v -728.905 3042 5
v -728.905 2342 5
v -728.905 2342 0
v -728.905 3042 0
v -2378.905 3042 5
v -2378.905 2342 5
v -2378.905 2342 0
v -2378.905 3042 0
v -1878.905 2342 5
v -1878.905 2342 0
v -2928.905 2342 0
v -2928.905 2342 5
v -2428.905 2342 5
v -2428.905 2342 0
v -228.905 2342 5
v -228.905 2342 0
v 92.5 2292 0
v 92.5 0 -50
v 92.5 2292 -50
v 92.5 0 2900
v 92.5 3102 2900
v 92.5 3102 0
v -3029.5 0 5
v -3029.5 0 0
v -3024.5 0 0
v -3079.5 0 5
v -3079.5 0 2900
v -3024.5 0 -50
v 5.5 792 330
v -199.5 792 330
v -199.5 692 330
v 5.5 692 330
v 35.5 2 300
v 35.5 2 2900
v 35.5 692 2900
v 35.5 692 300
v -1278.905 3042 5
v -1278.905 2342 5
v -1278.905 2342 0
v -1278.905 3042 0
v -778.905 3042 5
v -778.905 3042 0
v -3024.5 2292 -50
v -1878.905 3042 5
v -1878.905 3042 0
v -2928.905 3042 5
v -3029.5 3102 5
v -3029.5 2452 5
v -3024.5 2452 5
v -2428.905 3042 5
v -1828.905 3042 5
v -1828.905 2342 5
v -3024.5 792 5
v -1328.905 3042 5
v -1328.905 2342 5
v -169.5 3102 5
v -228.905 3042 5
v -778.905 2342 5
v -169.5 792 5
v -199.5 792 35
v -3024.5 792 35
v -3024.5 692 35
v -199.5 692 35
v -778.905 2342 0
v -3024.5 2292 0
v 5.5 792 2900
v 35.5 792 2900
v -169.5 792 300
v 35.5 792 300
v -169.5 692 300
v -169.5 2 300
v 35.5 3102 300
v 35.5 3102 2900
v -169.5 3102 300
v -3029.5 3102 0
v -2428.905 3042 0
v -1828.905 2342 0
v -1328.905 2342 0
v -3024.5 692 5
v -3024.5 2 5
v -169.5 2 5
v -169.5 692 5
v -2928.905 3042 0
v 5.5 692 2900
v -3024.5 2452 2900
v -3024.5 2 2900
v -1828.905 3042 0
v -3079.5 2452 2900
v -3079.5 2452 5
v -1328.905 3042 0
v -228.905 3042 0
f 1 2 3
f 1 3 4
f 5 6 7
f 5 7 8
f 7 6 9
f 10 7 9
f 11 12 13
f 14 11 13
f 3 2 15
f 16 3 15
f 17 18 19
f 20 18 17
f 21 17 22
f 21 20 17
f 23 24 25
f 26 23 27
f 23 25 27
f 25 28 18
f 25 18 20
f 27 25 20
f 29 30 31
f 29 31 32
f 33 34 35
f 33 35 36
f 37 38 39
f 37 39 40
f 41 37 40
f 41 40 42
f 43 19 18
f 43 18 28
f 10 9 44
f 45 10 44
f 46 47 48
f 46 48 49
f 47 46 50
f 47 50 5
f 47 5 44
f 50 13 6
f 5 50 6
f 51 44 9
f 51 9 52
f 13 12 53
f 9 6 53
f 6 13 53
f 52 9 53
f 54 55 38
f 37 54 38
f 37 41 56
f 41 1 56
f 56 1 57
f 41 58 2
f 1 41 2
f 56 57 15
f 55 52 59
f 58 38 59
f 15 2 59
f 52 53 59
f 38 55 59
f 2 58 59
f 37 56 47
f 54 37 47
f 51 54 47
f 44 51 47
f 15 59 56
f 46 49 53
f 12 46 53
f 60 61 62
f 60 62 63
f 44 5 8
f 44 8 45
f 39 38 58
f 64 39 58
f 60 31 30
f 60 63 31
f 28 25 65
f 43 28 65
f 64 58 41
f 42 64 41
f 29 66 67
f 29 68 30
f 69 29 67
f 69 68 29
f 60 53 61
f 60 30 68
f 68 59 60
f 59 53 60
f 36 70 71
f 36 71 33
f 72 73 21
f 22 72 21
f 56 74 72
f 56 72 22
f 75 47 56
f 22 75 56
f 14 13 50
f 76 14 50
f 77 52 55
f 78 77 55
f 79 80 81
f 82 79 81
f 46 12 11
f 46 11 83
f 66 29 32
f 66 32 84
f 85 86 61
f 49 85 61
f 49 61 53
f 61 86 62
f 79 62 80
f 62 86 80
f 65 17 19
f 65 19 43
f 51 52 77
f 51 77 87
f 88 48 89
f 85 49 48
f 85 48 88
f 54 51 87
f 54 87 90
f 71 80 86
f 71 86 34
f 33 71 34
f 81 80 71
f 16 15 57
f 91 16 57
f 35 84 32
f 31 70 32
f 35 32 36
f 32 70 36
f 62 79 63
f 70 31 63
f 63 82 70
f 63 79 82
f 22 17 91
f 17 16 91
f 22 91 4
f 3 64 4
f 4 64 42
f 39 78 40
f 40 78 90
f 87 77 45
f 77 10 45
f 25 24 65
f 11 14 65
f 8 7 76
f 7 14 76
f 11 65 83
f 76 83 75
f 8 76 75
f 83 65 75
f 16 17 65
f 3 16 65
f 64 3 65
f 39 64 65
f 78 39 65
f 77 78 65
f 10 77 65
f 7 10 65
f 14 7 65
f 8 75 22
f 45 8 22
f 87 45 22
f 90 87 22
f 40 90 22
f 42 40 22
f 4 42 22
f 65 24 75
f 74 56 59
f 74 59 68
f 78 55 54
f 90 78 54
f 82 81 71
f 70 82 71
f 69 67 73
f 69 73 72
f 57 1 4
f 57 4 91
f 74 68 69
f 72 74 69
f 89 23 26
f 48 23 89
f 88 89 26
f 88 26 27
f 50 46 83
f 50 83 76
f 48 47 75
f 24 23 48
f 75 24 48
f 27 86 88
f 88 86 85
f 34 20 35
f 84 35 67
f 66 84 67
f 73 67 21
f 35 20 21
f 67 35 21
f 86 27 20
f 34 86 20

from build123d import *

# Parameters (mm, degrees)
CROQUIS1_W               = 3070
CROQUIS1_H               = 2900
SALIENTE_EXTRUIR1_DEPTH  = 2
CROQUIS4_W               = 5
CROQUIS4_H               = 2600
CROQUIS4_W_2             = 2860
CROQUIS4_H_2             = 5
SALIENTE_EXTRUIR3_DEPTH  = 3100
CROQUIS5_W               = 5
CROQUIS5_H               = 2895
SALIENTE_EXTRUIR4_DEPTH  = 2450
CROQUIS6_W               = 2855
CROQUIS6_H               = 100
SALIENTE_EXTRUIR5_DEPTH  = 30
CROQUIS7_W               = 300
CROQUIS7_H               = 100
SALIENTE_EXTRUIR6_DEPTH  = 30
CROQUIS8_W               = 235
CROQUIS8_H               = 100
SALIENTE_EXTRUIR7_DEPTH  = 30
CROQUIS9_W               = 2600
CROQUIS9_H               = 100
SALIENTE_EXTRUIR8_DEPTH  = 30
CROQUIS11_W              = 500
CROQUIS11_H              = 700
CORTAR_EXTRUIR1_DEPTH    = 30
CROQUIS18_W              = 2900
CROQUIS18_H              = 3102
SALIENTE_EXTRUIR9_DEPTH  = 2
CROQUIS23_W              = 2900
CROQUIS23_H              = 3102
SALIENTE_EXTRUIR10_DEPTH = 50
CROQUIS24_W              = 3117
CROQUIS24_H              = 2292
SALIENTE_EXTRUIR11_DEPTH = 50
CROQUIS25_W              = 2895
CROQUIS25_H              = 2452
SALIENTE_EXTRUIR12_DEPTH = 50


with BuildPart() as part:
    # Croquis1 → Saliente-Extruir1 (new body)
    with BuildSketch(Plane(origin=(0, 0, 0), x_dir=(1, 0, 0), z_dir=(0, 1, 0))):
        with Locations((-1494.5, -1450)):
            Rectangle(CROQUIS1_W, CROQUIS1_H)
    extrude(amount=SALIENTE_EXTRUIR1_DEPTH)

    # Croquis4 → Saliente-Extruir3 (add)
    with BuildSketch(Plane(origin=(0, 2, 0), x_dir=(1, 0, 0), z_dir=(0, 1, 0))):
        with Locations((38, -1600)):
            Rectangle(CROQUIS4_W, CROQUIS4_H)
        Polygon((40.5, -300), (40.5, 0), (-169.5, 0), (-169.5, -5), (-169.5, -300), (35.5, -300), align=None)
        with Locations((-1599.5, -2.5)):
            Rectangle(CROQUIS4_W_2, CROQUIS4_H_2)
    extrude(amount=SALIENTE_EXTRUIR3_DEPTH)

    # Croquis5 → Saliente-Extruir4 (add)
    with BuildSketch(Plane(origin=(0, 2, 0), x_dir=(1, 0, 0), z_dir=(0, 1, 0))):
        with Locations((-3027, -1452.5)):
            Rectangle(CROQUIS5_W, CROQUIS5_H)
    extrude(amount=SALIENTE_EXTRUIR4_DEPTH)

    # Croquis6 → Saliente-Extruir5 (add)
    with BuildSketch(Plane.XY.offset(5)):
        with Locations((-1597, 742)):
            Rectangle(CROQUIS6_W, CROQUIS6_H)
    extrude(amount=SALIENTE_EXTRUIR5_DEPTH)

    # Croquis7 → Saliente-Extruir6 (add)
    with BuildSketch(Plane.ZY.offset(169.5)):
        with Locations((150, 742)):
            Rectangle(CROQUIS7_W, CROQUIS7_H)
    extrude(amount=SALIENTE_EXTRUIR6_DEPTH)

    # Croquis8 → Saliente-Extruir7 (add)
    with BuildSketch(Plane.XY.offset(300)):
        with Locations((-82, 742)):
            Rectangle(CROQUIS8_W, CROQUIS8_H)
    extrude(amount=SALIENTE_EXTRUIR7_DEPTH)

    # Croquis9 → Saliente-Extruir8 (add)
    with BuildSketch(Plane.ZY.offset(-35.5)):
        with Locations((1600, 742)):
            Rectangle(CROQUIS9_W, CROQUIS9_H)
    extrude(amount=SALIENTE_EXTRUIR8_DEPTH)

    # Croquis11 → Cortar-Extruir1 (cut)
    with BuildSketch(Plane.XY.offset(5)):
        with Locations((-2678.905145956, 2692)):
            Rectangle(CROQUIS11_W, CROQUIS11_H)
        with Locations((-2128.905145956, 2692)):
            Rectangle(CROQUIS11_W, CROQUIS11_H)
        with Locations((-1578.905145956, 2692)):
            Rectangle(CROQUIS11_W, CROQUIS11_H)
        with Locations((-1028.905145956, 2692)):
            Rectangle(CROQUIS11_W, CROQUIS11_H)
        with Locations((-478.905145956, 2692)):
            Rectangle(CROQUIS11_W, CROQUIS11_H)
    extrude(amount=-CORTAR_EXTRUIR1_DEPTH, mode=Mode.SUBTRACT)

    # Croquis18 → Saliente-Extruir9 (add)
    with BuildSketch(Plane(origin=(40.5, 0, 0), x_dir=(0, 0, -1), z_dir=(1, 0, 0))):
        with Locations((-1450, 1551)):
            Rectangle(CROQUIS18_W, CROQUIS18_H)
    extrude(amount=SALIENTE_EXTRUIR9_DEPTH)

    # Croquis23 → Saliente-Extruir10 (add)
    with BuildSketch(Plane(origin=(42.5, 0, 0), x_dir=(0, 0, -1), z_dir=(1, 0, 0))):
        with Locations((-1450, 1551)):
            Rectangle(CROQUIS23_W, CROQUIS23_H)
    extrude(amount=SALIENTE_EXTRUIR10_DEPTH)

    # Croquis24 → Saliente-Extruir11 (add)
    with BuildSketch(Plane(origin=(0, 0, 0), x_dir=(-1, 0, 0), z_dir=(0, 0, -1))):
        with Locations((1466, 1146)):
            Rectangle(CROQUIS24_W, CROQUIS24_H)
    extrude(amount=SALIENTE_EXTRUIR11_DEPTH)

    # Croquis25 → Saliente-Extruir12 (add)
    with BuildSketch(Plane.ZY.offset(3029.5)):
        with Locations((1452.5, 1226)):
            Rectangle(CROQUIS25_W, CROQUIS25_H)
    extrude(amount=SALIENTE_EXTRUIR12_DEPTH)


solid = part.part
